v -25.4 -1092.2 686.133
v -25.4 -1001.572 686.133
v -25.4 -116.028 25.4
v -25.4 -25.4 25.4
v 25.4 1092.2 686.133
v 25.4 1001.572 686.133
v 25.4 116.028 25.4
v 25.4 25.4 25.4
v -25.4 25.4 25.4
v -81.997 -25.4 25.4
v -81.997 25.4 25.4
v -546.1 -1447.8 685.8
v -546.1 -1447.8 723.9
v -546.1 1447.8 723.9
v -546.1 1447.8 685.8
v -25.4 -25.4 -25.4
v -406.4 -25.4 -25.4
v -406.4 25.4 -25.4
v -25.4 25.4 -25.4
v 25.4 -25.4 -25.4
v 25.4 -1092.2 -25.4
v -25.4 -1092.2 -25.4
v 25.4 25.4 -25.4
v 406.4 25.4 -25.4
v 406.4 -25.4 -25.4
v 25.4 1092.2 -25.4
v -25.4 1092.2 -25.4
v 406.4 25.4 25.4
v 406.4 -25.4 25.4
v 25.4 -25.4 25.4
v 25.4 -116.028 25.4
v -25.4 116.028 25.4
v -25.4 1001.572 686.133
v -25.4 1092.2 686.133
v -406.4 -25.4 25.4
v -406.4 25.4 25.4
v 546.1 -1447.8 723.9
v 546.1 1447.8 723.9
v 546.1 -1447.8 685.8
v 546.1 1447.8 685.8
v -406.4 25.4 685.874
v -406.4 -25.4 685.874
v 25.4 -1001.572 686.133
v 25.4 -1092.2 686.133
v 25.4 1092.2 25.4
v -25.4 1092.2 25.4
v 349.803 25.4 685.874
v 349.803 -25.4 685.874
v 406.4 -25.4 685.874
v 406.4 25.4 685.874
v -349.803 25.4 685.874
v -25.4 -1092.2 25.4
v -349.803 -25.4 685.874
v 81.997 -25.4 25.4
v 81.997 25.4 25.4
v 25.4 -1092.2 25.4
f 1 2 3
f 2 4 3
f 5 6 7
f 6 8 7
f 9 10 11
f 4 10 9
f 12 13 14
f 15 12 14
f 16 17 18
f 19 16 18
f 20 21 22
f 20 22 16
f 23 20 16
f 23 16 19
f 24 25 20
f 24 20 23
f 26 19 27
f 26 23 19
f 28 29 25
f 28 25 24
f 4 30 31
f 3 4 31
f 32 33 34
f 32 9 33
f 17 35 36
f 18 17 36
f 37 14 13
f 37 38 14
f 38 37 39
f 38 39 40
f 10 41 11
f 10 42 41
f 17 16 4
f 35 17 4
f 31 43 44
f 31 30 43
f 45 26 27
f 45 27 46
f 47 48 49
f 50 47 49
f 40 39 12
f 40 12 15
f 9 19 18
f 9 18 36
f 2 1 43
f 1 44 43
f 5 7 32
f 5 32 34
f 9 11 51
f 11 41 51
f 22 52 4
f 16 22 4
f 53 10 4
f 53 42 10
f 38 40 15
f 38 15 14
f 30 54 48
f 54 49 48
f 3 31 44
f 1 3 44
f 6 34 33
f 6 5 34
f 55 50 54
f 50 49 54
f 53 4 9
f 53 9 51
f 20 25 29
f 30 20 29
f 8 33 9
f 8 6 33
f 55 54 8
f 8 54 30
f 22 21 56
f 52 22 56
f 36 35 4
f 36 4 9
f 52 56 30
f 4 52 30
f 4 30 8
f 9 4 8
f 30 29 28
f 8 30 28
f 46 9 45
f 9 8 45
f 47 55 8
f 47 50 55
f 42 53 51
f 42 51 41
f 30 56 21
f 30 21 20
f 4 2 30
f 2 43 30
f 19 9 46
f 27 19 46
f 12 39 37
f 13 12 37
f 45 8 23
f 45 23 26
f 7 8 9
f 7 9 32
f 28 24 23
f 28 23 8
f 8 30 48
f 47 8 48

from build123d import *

# Parameters (mm, degrees)
F0_W      = 2184.4
F0_H      = 50.8
F1_DEPTH  = 25.4
F2_W      = 50.8
F2_H      = 50.8
F3_DEPTH  = 406.4
F4_W      = 1447.8
F4_H      = 38.1
F5_DEPTH  = 546.1
F7_DEPTH  = 25.4
F10_DEPTH = 25.4


with BuildPart() as f1:
    # F0 (on Right) → F1 (new body, symmetric)
    with BuildSketch(Plane.YZ):
        Rectangle(F0_W, F0_H)
    extrude(amount=F1_DEPTH, both=True)

    # F2 (on Right) → F3 (join, symmetric)
    with BuildSketch(Plane.YZ):
        Rectangle(F2_W, F2_H)
    extrude(amount=F3_DEPTH, both=True)


with BuildPart() as f5:
    # F4 (on Right) → F5 (new body, symmetric)
    with BuildSketch(Plane.YZ):
        with Locations((-723.9, 704.85)):
            Rectangle(F4_W, F4_H)
        with Locations((723.9, 704.85)):
            Rectangle(F4_W, F4_H)
    extrude(amount=F5_DEPTH, both=True)


with BuildPart() as f7:
    # F6 (on Right) → F7 (new body, symmetric)
    with BuildSketch(Plane.YZ):
        Polygon((1001.571734, 686.133206), (25.4, 25.4), (116.028266, 25.4), (1092.2, 686.133206), align=None)
    extrude(amount=F7_DEPTH, both=True)


with BuildPart() as f8_1:
    # F8: instance of F7
    add(f7.part.mirror(Plane.XZ))


with BuildPart() as f10:
    # F9 (on Front) → F10 (new body, symmetric)
    with BuildSketch(Plane.XZ):
        Polygon((-81.996874, 25.4), (-25.4, 25.4), (-349.803126, 685.874412), (-406.4, 685.874412), align=None)
    extrude(amount=F10_DEPTH, both=True)


with BuildPart() as f11_1:
    # F11: instance of F10
    add(f10.part.mirror(Plane.YZ))


solid = Compound([f1.part, f5.part, f7.part, f8_1.part, f10.part, f11_1.part])
